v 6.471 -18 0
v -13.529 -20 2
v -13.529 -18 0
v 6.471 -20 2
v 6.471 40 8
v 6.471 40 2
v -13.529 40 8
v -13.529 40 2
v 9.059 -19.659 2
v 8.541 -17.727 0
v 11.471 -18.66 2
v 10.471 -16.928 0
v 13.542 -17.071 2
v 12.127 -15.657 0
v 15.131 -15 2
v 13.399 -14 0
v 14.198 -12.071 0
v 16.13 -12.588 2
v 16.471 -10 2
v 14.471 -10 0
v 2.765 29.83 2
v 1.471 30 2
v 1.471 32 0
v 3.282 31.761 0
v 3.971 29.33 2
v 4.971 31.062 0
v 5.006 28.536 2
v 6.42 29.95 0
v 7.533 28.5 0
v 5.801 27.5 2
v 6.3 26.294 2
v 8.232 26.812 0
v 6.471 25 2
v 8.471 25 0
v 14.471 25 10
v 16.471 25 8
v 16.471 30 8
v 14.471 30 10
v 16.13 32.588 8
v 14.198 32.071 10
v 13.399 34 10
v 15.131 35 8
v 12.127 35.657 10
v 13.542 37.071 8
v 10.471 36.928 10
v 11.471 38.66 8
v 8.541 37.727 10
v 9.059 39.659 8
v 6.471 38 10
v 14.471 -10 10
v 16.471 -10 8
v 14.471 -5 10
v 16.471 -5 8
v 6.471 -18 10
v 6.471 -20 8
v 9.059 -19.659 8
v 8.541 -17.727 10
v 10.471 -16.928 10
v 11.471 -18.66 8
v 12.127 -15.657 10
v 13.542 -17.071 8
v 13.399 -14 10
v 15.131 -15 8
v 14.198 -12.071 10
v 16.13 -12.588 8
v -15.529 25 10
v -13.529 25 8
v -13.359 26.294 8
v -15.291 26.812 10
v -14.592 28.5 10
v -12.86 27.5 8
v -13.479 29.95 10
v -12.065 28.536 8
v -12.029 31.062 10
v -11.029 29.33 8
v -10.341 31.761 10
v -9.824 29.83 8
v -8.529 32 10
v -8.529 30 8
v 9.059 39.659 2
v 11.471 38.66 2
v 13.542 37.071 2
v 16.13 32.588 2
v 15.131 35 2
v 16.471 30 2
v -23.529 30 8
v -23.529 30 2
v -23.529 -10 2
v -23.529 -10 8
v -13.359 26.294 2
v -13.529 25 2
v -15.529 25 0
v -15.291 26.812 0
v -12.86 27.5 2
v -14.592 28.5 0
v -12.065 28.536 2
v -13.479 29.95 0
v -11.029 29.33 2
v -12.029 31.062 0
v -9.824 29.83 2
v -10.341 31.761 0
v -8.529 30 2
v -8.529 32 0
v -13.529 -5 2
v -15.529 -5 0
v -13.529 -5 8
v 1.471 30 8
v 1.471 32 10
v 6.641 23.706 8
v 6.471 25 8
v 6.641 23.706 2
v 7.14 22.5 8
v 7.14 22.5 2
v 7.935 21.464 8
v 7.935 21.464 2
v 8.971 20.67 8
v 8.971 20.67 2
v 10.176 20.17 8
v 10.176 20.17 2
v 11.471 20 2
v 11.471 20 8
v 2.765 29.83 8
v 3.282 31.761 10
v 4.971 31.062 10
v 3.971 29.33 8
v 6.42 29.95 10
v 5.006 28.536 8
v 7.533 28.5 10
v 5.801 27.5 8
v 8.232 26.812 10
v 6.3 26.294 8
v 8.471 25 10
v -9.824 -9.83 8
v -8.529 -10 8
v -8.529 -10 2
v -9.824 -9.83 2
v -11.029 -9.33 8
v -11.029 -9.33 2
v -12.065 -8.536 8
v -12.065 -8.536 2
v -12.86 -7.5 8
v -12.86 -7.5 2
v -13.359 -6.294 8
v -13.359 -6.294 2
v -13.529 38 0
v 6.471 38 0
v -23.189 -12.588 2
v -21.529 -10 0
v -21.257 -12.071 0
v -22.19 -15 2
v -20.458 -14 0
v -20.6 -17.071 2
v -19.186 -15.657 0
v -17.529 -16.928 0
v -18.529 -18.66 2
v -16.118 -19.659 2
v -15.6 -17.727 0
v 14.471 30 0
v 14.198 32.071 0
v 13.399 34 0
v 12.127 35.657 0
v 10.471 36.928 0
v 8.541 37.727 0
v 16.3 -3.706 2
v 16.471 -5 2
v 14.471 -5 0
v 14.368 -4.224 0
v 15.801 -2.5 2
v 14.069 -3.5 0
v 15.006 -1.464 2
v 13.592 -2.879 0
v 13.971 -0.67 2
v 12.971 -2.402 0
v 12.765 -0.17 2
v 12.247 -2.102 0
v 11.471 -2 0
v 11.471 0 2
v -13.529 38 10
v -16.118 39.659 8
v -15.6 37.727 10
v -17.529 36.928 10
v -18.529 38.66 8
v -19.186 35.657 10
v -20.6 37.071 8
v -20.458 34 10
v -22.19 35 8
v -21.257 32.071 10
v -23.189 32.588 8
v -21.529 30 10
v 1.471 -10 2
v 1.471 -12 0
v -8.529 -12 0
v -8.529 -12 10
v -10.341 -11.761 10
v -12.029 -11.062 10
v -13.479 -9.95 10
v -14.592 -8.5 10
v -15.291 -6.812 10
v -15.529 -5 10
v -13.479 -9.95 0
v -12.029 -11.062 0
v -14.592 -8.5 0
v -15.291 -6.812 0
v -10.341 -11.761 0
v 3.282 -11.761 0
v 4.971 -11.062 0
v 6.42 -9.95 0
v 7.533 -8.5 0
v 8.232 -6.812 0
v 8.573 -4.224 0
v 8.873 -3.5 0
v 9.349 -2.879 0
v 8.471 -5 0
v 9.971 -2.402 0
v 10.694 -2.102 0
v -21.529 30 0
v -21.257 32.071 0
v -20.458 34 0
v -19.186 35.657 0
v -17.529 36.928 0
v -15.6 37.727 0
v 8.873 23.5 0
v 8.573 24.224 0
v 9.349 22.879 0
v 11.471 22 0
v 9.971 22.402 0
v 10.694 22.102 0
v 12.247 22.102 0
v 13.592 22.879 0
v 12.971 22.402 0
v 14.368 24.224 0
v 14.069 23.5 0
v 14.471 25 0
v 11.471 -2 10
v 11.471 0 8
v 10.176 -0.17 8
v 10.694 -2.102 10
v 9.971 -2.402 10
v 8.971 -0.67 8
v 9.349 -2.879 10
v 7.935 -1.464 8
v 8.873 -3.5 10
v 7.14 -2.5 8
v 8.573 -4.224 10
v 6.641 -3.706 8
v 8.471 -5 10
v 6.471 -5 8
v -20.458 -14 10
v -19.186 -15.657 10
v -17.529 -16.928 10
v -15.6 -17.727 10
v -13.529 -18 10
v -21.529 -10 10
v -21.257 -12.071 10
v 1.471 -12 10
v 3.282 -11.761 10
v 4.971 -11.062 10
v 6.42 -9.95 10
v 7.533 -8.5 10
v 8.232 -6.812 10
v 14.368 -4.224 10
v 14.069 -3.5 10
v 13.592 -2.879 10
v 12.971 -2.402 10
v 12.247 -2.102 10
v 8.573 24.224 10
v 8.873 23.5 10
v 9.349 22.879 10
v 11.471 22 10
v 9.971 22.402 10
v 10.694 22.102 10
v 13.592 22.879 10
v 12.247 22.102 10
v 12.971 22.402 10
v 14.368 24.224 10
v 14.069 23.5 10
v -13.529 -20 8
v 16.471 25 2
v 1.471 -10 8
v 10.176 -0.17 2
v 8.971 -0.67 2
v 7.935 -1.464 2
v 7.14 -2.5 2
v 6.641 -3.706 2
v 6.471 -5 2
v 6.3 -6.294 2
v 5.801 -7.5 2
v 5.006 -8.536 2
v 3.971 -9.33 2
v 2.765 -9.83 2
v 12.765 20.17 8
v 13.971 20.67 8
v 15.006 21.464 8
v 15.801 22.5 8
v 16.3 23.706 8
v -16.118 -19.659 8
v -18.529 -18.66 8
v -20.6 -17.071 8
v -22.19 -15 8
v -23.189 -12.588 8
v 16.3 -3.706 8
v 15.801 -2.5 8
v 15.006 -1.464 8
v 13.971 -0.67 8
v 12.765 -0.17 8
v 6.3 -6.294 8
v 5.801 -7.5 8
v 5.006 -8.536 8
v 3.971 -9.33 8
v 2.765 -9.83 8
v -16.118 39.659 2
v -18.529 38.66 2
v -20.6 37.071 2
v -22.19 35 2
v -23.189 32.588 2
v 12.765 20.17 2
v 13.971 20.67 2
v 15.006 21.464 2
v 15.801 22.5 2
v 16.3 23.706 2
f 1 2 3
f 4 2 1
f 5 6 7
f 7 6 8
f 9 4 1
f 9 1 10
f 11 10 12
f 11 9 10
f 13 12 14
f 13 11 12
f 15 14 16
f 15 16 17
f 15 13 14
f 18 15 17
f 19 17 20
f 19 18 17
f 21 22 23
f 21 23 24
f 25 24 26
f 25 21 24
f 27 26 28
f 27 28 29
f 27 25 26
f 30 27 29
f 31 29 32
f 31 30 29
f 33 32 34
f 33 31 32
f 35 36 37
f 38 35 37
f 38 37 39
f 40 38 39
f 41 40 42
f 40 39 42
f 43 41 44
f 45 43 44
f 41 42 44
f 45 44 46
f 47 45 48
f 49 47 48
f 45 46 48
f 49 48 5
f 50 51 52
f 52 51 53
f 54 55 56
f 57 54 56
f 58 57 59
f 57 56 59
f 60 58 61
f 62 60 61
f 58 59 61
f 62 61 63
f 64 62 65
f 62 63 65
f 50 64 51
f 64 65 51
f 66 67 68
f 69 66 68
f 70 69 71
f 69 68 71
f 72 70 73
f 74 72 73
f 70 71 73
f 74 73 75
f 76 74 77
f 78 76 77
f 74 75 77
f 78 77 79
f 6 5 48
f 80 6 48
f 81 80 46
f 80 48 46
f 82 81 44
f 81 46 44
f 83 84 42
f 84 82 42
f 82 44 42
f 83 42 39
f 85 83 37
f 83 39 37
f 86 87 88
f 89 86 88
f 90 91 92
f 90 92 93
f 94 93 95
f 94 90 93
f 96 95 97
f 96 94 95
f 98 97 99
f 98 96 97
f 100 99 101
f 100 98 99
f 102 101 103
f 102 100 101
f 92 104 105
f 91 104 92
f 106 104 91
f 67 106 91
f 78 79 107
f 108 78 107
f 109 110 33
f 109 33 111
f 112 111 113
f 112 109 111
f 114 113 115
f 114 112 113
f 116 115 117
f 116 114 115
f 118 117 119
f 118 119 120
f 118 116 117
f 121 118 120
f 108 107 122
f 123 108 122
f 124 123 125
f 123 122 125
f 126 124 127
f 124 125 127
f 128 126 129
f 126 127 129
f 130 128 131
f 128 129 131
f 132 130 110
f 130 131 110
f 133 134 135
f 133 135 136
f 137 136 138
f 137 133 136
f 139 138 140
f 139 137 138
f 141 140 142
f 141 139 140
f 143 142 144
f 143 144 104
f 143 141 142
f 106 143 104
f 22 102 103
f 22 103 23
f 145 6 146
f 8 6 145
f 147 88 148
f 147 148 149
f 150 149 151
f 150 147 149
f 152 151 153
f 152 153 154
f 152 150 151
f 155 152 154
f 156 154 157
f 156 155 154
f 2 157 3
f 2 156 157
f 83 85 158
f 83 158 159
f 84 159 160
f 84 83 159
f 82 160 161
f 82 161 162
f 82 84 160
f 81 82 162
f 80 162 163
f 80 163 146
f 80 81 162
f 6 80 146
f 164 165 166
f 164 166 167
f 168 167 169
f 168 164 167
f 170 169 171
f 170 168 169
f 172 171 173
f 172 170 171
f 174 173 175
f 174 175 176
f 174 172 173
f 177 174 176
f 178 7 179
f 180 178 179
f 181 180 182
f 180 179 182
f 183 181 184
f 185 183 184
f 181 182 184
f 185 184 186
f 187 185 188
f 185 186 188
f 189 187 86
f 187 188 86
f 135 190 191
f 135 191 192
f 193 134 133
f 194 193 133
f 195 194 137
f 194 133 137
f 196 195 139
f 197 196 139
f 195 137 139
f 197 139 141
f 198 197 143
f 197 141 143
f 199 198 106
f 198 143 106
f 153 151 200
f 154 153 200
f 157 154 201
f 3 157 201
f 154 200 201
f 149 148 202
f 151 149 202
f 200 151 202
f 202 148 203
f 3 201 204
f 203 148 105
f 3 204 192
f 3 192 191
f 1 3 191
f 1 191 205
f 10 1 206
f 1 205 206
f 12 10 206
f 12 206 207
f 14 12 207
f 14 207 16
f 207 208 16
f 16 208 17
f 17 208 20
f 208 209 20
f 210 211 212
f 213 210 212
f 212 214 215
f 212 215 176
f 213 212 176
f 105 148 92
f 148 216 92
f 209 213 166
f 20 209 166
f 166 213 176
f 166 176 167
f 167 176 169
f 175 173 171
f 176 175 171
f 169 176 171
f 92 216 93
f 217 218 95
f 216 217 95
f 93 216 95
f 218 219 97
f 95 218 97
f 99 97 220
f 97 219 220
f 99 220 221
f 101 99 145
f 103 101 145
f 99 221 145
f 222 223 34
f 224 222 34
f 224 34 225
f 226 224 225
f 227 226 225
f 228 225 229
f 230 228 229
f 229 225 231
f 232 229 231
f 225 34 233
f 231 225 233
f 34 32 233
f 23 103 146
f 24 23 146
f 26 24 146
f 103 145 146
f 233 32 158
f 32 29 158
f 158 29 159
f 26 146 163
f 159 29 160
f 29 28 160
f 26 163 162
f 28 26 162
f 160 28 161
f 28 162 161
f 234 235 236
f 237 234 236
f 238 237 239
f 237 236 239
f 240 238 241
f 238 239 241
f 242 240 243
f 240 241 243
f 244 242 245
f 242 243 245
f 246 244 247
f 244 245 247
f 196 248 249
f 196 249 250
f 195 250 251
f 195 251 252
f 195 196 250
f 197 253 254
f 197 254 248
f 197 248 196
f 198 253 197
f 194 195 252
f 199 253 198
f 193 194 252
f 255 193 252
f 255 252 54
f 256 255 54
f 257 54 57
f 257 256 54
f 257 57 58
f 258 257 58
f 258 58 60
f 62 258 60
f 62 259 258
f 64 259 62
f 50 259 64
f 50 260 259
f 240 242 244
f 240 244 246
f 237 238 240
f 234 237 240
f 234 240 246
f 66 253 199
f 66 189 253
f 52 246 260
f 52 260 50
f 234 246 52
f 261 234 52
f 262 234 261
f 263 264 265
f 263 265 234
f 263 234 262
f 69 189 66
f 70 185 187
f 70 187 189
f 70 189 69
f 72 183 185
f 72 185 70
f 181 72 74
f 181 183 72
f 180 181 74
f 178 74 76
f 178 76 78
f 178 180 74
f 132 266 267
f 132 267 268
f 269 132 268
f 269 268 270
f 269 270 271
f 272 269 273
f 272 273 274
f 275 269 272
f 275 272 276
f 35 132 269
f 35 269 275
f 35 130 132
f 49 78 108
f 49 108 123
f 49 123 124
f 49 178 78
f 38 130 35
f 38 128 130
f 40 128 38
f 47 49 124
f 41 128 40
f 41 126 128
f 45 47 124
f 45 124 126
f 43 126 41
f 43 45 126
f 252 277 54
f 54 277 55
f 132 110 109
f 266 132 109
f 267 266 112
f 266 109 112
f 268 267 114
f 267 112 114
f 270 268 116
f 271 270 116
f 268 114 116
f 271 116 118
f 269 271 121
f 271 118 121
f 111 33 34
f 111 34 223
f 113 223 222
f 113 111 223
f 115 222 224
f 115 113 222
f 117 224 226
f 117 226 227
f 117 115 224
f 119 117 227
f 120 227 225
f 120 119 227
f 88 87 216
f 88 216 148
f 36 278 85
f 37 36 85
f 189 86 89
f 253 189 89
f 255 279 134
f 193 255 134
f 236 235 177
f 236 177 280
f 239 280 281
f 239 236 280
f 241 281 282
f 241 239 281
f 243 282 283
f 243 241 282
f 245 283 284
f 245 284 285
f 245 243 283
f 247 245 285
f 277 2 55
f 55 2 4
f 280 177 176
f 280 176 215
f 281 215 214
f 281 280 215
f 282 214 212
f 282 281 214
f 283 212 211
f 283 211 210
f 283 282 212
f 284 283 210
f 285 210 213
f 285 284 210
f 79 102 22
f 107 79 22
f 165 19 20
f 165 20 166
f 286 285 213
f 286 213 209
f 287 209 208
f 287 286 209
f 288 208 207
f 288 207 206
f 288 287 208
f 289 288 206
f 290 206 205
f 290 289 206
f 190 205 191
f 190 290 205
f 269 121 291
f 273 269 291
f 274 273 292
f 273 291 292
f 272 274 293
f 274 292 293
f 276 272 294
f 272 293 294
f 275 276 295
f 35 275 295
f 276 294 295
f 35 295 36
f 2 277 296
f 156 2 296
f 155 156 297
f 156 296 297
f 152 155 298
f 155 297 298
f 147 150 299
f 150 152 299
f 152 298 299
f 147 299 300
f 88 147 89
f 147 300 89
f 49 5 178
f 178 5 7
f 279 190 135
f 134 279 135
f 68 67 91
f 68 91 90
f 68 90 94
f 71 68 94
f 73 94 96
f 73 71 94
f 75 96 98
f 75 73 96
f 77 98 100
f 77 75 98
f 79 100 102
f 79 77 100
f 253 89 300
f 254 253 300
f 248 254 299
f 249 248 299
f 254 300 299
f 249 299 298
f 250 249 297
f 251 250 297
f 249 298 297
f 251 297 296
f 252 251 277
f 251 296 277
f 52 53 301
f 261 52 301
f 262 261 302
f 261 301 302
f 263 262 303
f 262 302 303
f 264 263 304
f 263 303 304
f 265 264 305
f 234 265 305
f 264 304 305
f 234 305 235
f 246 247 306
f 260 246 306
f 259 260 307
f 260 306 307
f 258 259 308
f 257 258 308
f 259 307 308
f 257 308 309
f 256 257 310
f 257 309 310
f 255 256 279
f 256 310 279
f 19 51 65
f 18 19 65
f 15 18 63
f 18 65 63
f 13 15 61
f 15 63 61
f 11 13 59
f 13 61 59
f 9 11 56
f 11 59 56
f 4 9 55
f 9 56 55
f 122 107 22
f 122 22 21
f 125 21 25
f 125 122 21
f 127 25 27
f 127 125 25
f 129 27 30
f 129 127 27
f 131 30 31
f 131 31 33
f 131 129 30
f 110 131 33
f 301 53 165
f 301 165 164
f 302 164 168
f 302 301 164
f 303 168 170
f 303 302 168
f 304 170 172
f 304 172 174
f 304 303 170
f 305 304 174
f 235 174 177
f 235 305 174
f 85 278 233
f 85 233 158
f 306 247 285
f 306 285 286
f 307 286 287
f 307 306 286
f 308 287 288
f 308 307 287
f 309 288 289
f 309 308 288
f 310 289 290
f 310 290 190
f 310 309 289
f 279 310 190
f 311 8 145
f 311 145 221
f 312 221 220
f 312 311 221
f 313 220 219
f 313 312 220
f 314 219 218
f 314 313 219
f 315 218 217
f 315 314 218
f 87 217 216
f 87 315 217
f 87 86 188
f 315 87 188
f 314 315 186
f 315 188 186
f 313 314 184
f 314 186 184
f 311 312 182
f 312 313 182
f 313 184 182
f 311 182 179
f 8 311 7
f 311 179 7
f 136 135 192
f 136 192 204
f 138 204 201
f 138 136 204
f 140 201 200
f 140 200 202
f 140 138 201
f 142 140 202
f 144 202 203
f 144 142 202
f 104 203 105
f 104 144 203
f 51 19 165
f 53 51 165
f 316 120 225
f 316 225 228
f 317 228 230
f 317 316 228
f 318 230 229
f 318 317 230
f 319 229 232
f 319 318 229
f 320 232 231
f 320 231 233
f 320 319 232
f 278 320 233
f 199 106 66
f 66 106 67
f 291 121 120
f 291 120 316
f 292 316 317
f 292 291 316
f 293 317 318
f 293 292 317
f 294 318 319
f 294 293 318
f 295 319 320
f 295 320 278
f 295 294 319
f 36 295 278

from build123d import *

# Parameters (mm, degrees)
F0_W     = 10
F0_H     = 10
F1_DEPTH = 10
F2_R     = 4.99999
F3_R     = 10
F4_SIZE  = 2


# Not quite as in the source:
# - a fillet or chamfer is up to 0.001 mm smaller than in the source, because OpenCascade refuses the exact size


with BuildPart() as f1:
    # F0 (on Top) → F1 (new body)
    with BuildSketch(Plane.XY):
        Polygon((6.4705845391, 30), (6.4705845391, 40), (-23.5294154609, 40), (-23.5294154609, 30), (-13.5294154609, 30), align=None)
        Polygon((16.4705845391, 40), (6.4705845391, 40), (6.4705845391, 30), (6.4705845391, 20), (16.4705845391, 20), align=None)
        Polygon((-13.5294154609, -10), (-13.5294154609, 30), (-23.5294154609, 30), (-23.5294154609, -20), (-13.5294154609, -20), align=None)
        Polygon((6.4705845391, -10), (-13.5294154609, -10), (-13.5294154609, -20), (16.4705845391, -20), (16.4705845391, -10), align=None)
        with Locations((11.4705845391, -5)):
            Rectangle(F0_W, F0_H)
    extrude(amount=F1_DEPTH)

    # F2 (radius 5 in the source; OpenCascade refuses exactly that, so slightly less here)
    f2_edges = [f1.edges().sort_by_distance(p)[0] for p in [
        (16.470585, 0, 5),
        (6.470585, 0, 5),
        (-13.529415, -10, 5),
        (6.470585, -10, 5),
        (6.470585, 20, 5),
        (6.470585, 30, 5),
        (-13.529415, 30, 5),
        (16.470585, 20, 5),
    ]]
    fillet(f2_edges, radius=F2_R)

    # F3
    f3_edges = [f1.edges().sort_by_distance(p)[0] for p in [
        (16.470585, 40, 5),
        (-23.529415, 40, 5),
        (16.470585, -20, 5),
        (-23.529415, -20, 5),
    ]]
    fillet(f3_edges, radius=F3_R)

    # F4
    f4_edges = [f1.edges().sort_by_distance(p)[0] for p in [
        (16.470585, 27.499995, 10),
        (13.541652, 37.071068, 10),
        (15.006121, 21.464463, 10),
        (-3.529415, 40, 10),
        (11.470585, 20, 10),
        (-20.600483, 37.071068, 10),
        (7.935048, 21.464463, 10),
        (-23.529415, 10, 10),
        (6.470585, 25, 10),
        (-20.600483, -17.071068, 10),
        (5.006121, 28.535537, 10),
        (-3.529415, -20, 10),
        (-3.529415, 30, 10),
        (13.541652, -17.071068, 10),
        (-12.064952, 28.535537, 10),
        (16.470585, -7.499995, 10),
        (-13.529415, 10, 10),
        (15.006121, -1.464463, 10),
        (-12.064952, -8.535537, 10),
        (11.470585, 0, 10),
        (-3.529415, -10, 10),
        (7.935048, -1.464463, 10),
        (5.006121, -8.535537, 10),
        (6.470585, -5, 10),
        (16.470585, 27.499995, 0),
        (13.541652, 37.071068, 0),
        (15.006121, 21.464463, 0),
        (-3.529415, 40, 0),
        (11.470585, 20, 0),
        (-20.600483, 37.071068, 0),
        (7.935048, 21.464463, 0),
        (-23.529415, 10, 0),
        (6.470585, 25, 0),
        (-20.600483, -17.071068, 0),
        (5.006121, 28.535537, 0),
        (-3.529415, -20, 0),
        (-3.529415, 30, 0),
        (13.541652, -17.071068, 0),
        (-12.064952, 28.535537, 0),
        (16.470585, -7.499995, 0),
        (-13.529415, 10, 0),
        (15.006121, -1.464463, 0),
        (-12.064952, -8.535537, 0),
        (11.470585, 0, 0),
        (-3.529415, -10, 0),
        (7.935048, -1.464463, 0),
        (5.006121, -8.535537, 0),
        (6.470585, -5, 0),
    ]]
    chamfer(f4_edges, length=F4_SIZE)


solid = f1.part
